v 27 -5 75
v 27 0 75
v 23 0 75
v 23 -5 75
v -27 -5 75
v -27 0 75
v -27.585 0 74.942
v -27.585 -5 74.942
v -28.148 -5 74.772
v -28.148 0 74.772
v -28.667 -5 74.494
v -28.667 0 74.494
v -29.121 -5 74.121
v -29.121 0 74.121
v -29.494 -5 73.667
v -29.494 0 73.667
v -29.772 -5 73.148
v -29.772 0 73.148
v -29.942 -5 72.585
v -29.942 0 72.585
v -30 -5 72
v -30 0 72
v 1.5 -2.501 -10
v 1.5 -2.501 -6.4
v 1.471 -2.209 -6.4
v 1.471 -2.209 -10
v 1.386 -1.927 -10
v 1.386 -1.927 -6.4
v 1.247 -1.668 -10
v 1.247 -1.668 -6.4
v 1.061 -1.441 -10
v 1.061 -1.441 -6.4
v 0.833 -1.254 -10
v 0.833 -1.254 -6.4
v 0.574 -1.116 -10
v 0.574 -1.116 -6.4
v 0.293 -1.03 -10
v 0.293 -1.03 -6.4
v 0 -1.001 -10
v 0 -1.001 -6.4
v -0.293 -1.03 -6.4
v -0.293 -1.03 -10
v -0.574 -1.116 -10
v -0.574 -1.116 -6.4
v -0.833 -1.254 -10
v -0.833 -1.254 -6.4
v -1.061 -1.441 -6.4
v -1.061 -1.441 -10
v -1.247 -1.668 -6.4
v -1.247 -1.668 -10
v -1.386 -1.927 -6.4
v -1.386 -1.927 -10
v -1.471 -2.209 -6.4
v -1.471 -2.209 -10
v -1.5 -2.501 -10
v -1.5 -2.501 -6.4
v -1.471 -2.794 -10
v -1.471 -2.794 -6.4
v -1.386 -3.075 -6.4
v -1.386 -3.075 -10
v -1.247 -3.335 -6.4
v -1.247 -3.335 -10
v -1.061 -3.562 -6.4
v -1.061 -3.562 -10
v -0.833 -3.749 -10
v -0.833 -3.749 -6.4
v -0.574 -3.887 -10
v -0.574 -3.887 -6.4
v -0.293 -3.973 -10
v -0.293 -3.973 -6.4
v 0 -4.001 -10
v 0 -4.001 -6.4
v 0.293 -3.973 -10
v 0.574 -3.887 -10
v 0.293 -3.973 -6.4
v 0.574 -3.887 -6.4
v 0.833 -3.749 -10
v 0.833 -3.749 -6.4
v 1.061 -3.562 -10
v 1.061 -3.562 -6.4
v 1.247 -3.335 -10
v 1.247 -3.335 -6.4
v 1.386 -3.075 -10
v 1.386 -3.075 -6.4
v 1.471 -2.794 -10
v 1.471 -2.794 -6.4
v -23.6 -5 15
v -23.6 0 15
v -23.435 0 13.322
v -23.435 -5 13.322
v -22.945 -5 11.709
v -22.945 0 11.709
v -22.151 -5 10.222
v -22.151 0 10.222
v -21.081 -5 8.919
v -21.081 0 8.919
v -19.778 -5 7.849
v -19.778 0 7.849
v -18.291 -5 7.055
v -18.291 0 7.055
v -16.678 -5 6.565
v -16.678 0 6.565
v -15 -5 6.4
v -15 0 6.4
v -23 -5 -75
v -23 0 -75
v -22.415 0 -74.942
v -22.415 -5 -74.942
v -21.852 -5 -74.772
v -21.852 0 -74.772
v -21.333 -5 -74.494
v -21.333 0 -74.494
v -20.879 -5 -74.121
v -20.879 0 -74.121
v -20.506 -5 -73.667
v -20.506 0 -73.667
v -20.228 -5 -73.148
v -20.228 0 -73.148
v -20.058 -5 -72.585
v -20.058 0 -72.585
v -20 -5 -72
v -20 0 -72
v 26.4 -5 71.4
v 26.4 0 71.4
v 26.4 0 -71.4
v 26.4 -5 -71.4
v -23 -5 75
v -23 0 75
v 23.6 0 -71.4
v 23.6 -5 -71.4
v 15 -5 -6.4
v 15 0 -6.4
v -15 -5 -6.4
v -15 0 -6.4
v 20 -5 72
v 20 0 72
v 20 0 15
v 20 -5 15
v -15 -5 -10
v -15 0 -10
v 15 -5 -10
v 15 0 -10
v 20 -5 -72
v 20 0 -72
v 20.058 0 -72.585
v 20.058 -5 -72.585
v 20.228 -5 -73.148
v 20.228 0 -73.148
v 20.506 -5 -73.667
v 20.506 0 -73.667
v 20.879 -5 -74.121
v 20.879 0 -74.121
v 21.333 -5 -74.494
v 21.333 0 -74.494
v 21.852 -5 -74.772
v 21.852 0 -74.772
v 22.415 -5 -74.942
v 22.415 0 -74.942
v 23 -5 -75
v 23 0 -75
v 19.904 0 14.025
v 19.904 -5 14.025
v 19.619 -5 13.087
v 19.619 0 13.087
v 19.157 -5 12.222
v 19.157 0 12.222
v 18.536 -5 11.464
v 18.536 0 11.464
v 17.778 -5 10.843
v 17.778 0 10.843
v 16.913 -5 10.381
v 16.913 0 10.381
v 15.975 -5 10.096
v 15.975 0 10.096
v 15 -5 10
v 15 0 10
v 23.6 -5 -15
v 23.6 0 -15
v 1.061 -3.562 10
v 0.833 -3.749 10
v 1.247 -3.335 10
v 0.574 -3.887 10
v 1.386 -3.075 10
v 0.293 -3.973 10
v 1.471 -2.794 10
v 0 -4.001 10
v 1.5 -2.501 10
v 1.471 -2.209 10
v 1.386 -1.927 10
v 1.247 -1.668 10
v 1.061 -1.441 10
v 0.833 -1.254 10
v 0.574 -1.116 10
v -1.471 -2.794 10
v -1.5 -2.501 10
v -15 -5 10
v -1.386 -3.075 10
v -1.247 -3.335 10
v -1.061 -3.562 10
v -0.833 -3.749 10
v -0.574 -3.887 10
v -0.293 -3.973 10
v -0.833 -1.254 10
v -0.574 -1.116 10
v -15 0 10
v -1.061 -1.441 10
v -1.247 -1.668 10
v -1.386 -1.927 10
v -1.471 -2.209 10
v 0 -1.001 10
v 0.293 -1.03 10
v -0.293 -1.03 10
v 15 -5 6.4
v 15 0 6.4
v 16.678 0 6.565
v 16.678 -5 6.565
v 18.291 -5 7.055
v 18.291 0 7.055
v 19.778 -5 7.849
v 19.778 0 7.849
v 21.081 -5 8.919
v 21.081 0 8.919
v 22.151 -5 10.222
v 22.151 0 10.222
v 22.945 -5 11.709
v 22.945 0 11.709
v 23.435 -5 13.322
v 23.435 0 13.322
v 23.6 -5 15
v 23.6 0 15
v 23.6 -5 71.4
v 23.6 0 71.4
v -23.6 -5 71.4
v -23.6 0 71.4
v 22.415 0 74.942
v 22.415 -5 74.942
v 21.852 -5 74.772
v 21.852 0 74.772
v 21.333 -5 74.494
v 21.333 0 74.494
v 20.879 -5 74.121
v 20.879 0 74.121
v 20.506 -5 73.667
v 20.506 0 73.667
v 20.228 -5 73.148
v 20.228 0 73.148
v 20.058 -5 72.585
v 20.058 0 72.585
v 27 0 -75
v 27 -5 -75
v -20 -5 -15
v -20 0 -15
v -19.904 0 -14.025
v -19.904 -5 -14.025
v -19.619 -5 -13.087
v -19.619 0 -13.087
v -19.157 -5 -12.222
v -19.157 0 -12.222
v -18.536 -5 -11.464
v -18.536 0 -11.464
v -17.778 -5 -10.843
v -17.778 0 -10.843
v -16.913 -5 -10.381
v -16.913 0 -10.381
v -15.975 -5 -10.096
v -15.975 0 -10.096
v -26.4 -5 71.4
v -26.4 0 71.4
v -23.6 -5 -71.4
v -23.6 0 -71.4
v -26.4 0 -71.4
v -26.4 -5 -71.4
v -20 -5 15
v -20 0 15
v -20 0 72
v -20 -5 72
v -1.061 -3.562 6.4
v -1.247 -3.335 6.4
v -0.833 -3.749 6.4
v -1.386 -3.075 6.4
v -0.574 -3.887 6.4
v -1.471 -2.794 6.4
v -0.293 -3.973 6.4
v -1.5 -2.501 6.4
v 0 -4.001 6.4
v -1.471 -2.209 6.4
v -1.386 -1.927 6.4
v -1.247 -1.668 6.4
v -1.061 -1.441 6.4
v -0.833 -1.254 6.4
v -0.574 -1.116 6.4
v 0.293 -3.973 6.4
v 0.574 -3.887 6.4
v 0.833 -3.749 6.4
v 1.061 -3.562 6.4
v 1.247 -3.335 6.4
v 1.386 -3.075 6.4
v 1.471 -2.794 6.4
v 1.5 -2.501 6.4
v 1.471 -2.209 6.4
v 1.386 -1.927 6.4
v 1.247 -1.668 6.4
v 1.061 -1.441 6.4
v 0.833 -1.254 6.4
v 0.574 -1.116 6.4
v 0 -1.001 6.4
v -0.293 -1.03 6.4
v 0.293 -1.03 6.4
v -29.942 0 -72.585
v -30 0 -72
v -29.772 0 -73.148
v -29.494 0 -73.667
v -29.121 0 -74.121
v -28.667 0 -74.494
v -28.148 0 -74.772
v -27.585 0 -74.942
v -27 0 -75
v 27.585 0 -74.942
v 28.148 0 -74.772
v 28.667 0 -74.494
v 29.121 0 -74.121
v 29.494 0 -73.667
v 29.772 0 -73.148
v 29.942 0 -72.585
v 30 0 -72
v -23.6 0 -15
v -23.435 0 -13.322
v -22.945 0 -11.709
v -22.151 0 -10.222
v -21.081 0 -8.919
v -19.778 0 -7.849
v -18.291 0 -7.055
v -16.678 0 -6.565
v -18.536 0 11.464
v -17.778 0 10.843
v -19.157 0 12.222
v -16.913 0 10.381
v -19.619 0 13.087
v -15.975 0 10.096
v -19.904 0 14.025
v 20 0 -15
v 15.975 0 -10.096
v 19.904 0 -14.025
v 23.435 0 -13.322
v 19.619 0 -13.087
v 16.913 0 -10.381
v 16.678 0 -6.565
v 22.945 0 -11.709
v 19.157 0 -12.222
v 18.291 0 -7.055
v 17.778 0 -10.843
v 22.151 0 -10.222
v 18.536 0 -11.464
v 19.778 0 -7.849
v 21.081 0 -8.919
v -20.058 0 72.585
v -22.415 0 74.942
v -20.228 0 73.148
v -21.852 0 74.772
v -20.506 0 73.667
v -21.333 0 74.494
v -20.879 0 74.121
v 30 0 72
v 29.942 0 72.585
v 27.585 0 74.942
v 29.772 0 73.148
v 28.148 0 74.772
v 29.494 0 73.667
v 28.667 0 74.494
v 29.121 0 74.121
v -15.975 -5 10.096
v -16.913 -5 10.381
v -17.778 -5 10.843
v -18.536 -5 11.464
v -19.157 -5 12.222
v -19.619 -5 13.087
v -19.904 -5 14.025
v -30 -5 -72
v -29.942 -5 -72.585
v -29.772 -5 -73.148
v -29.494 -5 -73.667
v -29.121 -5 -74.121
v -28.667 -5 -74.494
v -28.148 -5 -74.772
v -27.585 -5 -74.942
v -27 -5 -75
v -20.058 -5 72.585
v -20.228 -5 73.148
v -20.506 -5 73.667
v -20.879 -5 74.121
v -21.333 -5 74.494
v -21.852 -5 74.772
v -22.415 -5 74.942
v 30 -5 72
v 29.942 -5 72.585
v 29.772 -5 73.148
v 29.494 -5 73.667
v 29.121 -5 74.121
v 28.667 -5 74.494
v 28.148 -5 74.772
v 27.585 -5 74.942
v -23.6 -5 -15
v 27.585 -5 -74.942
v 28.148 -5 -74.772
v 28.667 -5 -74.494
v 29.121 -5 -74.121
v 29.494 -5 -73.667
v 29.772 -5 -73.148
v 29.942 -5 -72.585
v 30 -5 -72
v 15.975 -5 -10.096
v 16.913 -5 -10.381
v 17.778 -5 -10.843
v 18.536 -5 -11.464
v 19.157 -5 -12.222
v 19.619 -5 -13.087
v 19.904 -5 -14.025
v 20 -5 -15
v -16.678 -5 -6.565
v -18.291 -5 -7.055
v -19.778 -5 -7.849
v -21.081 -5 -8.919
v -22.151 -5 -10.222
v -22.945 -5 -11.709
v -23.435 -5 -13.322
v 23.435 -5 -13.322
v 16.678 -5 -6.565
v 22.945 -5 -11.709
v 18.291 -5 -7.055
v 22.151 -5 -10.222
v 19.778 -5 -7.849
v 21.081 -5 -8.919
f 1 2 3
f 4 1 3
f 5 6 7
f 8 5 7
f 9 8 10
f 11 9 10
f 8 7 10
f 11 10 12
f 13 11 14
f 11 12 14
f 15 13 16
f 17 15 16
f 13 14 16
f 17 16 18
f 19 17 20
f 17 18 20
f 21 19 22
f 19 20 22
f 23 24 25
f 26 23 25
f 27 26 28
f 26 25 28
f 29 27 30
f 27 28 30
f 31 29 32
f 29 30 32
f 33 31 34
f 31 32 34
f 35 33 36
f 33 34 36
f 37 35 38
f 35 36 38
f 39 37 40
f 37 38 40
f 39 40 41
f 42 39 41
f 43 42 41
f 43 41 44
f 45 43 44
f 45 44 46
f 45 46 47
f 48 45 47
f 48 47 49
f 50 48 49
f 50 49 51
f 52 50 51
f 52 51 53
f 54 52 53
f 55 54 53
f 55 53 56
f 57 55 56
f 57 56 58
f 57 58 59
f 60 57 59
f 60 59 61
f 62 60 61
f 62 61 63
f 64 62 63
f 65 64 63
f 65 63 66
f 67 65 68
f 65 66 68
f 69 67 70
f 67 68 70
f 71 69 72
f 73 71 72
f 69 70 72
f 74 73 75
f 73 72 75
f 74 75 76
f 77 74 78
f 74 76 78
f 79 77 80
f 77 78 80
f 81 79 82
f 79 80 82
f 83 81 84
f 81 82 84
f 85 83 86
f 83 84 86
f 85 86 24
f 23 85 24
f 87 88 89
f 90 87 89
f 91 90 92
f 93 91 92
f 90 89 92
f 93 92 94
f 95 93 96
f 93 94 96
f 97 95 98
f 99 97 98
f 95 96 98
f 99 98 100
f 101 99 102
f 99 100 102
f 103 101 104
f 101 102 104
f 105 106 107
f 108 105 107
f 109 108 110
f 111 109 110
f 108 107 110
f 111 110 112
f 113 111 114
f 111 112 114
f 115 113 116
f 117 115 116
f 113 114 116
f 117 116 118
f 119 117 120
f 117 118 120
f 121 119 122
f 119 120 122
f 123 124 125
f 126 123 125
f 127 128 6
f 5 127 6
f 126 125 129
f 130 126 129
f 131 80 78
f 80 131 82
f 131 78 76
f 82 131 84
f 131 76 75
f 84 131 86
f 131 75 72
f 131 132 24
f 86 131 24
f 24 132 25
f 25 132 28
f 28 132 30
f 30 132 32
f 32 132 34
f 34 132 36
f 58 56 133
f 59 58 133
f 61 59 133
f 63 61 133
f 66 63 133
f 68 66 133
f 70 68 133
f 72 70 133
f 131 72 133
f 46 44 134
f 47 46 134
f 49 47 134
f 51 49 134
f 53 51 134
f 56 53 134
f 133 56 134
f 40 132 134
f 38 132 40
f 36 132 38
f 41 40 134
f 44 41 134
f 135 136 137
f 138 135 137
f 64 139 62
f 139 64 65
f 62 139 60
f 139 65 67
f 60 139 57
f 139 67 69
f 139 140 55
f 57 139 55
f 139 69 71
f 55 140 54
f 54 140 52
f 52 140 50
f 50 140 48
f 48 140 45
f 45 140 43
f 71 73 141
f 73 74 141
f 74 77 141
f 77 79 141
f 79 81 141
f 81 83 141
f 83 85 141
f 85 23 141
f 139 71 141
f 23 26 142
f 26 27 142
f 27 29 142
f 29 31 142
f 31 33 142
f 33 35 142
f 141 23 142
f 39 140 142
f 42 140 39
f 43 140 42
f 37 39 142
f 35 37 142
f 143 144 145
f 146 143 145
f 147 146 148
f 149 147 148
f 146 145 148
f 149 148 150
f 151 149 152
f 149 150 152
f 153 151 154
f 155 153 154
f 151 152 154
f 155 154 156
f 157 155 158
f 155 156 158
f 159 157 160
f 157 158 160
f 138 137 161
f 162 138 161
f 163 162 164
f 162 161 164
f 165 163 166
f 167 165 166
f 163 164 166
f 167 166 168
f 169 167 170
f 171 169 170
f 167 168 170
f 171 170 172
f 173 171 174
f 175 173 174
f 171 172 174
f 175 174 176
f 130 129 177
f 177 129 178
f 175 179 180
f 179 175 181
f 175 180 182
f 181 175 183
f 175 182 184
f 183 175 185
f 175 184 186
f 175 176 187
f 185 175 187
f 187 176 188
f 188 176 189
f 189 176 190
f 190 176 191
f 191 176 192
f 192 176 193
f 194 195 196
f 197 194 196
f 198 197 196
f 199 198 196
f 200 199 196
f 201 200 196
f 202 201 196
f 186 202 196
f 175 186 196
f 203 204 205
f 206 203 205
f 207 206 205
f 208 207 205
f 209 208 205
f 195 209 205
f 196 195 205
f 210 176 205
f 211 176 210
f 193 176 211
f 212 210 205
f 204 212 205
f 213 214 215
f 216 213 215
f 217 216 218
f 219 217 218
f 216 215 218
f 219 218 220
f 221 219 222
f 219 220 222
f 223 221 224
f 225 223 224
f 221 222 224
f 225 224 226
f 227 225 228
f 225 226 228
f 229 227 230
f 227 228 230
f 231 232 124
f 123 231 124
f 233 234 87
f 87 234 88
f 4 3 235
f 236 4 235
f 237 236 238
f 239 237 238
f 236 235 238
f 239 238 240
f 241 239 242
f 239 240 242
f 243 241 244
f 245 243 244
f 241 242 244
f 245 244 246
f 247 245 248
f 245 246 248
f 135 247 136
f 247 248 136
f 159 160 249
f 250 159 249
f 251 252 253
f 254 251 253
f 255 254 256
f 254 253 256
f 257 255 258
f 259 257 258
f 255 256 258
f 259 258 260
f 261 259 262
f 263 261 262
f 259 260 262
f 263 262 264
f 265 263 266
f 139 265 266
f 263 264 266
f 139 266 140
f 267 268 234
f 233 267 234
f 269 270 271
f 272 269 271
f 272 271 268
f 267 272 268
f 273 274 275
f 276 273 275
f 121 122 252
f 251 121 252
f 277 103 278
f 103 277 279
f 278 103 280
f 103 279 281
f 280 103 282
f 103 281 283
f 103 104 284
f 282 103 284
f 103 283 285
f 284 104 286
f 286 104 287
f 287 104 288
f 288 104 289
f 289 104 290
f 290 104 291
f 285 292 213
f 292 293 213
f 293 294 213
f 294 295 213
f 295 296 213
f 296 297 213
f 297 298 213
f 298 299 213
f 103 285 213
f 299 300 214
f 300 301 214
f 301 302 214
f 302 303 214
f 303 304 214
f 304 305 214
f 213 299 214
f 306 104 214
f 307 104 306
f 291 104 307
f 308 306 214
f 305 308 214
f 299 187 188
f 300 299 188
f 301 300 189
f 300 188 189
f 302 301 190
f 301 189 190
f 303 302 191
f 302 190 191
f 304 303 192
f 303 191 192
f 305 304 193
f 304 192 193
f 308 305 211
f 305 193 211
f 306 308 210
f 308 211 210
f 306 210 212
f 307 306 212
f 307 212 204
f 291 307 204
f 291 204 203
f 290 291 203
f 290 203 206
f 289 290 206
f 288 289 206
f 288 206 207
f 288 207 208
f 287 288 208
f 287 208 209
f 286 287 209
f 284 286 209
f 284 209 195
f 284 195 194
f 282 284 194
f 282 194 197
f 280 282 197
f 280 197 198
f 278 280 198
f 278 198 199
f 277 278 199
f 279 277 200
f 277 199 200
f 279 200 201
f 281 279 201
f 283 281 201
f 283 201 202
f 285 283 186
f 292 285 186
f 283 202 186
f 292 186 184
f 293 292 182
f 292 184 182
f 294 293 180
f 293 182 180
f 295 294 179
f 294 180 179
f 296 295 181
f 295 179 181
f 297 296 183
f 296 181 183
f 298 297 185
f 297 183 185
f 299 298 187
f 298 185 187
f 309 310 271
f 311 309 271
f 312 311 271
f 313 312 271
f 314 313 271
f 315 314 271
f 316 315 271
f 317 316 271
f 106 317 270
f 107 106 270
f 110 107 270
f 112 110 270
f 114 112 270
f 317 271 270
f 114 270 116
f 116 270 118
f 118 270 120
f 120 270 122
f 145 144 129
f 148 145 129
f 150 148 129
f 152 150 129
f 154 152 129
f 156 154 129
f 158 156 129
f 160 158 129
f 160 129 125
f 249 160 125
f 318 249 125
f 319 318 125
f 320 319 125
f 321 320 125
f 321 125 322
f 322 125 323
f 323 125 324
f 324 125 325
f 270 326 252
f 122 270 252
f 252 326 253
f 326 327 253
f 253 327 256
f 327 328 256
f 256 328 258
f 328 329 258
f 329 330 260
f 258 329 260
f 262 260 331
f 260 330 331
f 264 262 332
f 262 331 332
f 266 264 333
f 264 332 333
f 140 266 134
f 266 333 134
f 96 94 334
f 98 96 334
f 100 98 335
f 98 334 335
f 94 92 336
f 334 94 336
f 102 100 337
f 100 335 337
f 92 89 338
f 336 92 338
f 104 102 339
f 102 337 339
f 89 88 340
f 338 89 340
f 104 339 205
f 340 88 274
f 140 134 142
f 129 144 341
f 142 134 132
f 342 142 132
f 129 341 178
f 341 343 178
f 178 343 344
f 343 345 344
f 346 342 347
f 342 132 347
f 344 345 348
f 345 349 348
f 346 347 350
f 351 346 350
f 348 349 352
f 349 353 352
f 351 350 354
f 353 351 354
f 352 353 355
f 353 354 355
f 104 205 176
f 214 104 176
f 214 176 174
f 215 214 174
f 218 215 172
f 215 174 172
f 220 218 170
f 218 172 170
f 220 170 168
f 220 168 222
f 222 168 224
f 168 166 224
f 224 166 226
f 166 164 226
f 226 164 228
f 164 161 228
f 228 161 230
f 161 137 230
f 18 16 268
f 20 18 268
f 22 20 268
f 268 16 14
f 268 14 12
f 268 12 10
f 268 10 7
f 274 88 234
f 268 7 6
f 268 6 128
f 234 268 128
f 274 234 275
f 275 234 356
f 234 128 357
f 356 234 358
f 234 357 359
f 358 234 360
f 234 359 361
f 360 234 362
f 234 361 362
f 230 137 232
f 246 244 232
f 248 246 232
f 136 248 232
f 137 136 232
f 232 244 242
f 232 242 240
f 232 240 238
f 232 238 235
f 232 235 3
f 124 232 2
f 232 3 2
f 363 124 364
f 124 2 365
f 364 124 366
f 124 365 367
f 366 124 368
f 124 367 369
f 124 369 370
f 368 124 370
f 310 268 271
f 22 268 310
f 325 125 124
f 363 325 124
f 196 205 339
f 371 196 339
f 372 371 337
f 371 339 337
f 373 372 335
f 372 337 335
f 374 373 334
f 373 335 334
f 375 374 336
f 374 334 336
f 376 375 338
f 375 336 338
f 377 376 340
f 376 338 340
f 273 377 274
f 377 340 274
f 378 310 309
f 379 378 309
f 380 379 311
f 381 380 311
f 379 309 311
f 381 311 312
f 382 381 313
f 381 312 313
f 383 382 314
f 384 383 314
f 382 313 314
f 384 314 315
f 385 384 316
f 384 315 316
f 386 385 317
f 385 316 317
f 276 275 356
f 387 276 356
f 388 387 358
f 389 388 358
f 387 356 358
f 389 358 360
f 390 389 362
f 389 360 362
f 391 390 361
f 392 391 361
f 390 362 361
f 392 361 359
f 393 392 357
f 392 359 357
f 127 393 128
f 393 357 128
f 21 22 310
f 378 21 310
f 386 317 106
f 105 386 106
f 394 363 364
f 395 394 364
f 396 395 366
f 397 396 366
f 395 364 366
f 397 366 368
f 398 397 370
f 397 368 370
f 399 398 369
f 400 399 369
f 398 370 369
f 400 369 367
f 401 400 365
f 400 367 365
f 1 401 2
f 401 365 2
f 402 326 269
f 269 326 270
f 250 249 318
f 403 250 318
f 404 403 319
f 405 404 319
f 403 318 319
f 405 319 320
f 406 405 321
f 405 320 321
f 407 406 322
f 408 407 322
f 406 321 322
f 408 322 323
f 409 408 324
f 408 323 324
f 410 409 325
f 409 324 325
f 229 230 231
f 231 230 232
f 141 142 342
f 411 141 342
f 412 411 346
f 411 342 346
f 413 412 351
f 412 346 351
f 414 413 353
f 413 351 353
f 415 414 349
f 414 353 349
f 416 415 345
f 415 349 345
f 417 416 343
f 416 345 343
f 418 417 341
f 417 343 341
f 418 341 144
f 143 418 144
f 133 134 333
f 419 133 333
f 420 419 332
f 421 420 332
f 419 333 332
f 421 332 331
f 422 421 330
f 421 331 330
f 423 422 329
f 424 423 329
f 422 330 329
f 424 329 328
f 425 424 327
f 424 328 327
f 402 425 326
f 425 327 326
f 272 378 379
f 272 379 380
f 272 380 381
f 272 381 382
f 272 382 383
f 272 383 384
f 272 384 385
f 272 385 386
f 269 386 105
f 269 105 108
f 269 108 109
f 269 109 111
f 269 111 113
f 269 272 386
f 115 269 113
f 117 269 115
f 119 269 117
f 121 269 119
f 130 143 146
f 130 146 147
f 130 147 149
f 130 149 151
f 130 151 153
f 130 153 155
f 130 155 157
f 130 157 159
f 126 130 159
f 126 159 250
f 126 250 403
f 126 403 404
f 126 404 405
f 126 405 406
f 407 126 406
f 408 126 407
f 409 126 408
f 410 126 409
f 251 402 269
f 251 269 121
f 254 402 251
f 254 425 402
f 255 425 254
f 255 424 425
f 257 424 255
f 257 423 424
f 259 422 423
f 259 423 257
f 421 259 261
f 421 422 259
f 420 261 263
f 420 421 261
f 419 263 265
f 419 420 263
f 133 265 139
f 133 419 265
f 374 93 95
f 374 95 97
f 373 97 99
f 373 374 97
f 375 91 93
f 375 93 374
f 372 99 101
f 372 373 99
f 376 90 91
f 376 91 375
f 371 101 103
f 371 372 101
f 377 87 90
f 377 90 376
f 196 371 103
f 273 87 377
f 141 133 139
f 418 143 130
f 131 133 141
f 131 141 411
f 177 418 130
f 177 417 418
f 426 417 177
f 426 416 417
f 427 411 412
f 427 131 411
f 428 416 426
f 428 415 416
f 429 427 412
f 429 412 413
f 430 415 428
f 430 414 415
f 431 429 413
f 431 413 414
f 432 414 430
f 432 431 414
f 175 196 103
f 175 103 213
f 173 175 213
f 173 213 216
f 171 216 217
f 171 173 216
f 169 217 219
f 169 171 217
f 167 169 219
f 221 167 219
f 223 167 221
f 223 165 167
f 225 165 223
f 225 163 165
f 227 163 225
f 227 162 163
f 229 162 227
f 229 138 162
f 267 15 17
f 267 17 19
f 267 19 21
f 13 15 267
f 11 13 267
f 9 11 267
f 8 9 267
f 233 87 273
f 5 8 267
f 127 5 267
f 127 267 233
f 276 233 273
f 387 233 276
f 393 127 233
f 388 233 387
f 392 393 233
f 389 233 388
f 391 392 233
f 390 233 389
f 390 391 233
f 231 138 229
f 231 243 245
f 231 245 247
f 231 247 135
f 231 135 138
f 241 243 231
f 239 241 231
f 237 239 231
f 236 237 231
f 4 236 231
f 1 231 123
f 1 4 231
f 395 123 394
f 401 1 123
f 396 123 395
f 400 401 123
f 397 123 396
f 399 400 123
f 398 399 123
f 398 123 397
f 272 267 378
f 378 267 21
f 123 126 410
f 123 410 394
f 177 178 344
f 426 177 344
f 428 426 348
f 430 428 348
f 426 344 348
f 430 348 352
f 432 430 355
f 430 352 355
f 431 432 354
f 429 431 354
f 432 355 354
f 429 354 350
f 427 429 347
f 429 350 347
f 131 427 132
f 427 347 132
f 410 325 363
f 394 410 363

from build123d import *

# Parameters (mm, degrees)
F1_DEPTH = 5
F2_R     = 1.5
F3_DEPTH = 25


with BuildPart() as f1:
    # F0 (on Front) → F1 (new body)
    with BuildSketch(Plane.XZ):
        with BuildLine():
            Line((-23, 75), (-27, 75))
            ThreePointArc((-27, 75), (-29.12132, 74.12132), (-30, 72))
            Line((-30, 72), (-30, -72))
            ThreePointArc((-30, -72), (-29.12132, -74.12132), (-27, -75))
            Line((-27, -75), (-23, -75))
            ThreePointArc((-23, -75), (-20.87868, -74.12132), (-20, -72))
            Line((-20, -72), (-20, -15))
            ThreePointArc((-20, -15), (-18.535534, -11.464466), (-15, -10))
            Line((-15, -10), (15, -10))
            ThreePointArc((15, -10), (18.535534, -11.464466), (20, -15))
            Line((20, -15), (20, -72))
            ThreePointArc((20, -72), (20.87868, -74.12132), (23, -75))
            Line((23, -75), (27, -75))
            ThreePointArc((27, -75), (29.12132, -74.12132), (30, -72))
            Line((30, -72), (30, 72))
            ThreePointArc((30, 72), (29.12132, 74.12132), (27, 75))
            Line((27, 75), (23, 75))
            ThreePointArc((23, 75), (20.87868, 74.12132), (20, 72))
            Line((20, 72), (20, 15))
            ThreePointArc((20, 15), (18.535534, 11.464466), (15, 10))
            Line((15, 10), (-15, 10))
            ThreePointArc((-15, 10), (-18.535534, 11.464466), (-20, 15))
            Line((-20, 15), (-20, 72))
            ThreePointArc((-20, 72), (-20.87868, 74.12132), (-23, 75))
        make_face()
        with BuildLine():
            Line((-23.600001, -71.399999), (-26.399999, -71.399999))
            Line((-26.399999, -71.399999), (-26.399999, 71.399999))
            Line((-26.399999, 71.399999), (-23.600001, 71.399999))
            Line((-23.600001, 71.399999), (-23.600001, 15))
            ThreePointArc((-23.600001, 15), (-21.081119, 8.918881), (-15, 6.399999))
            Line((-15, 6.399999), (15, 6.399999))
            ThreePointArc((15, 6.399999), (21.081119, 8.918881), (23.600001, 15))
            Line((23.600001, 15), (23.600001, 71.399999))
            Line((23.600001, 71.399999), (26.399999, 71.399999))
            Line((26.399999, 71.399999), (26.399999, -71.399999))
            Line((26.399999, -71.399999), (23.600001, -71.399999))
            Line((23.600001, -71.399999), (23.600001, -15))
            ThreePointArc((23.600001, -15), (21.081119, -8.918881), (15, -6.399999))
            Line((15, -6.399999), (-15, -6.399999))
            ThreePointArc((-15, -6.399999), (-21.081119, -8.918881), (-23.600001, -15))
            Line((-23.600001, -15), (-23.600001, -71.399999))
        make_face(mode=Mode.SUBTRACT)
    extrude(amount=F1_DEPTH)

    # F2 (on face) → F3 (cut)
    with BuildSketch(Plane.XY.offset(10)):
        with Locations((0, -2.50134)):
            Circle(F2_R)
    extrude(amount=-F3_DEPTH, mode=Mode.SUBTRACT)


solid = f1.part
